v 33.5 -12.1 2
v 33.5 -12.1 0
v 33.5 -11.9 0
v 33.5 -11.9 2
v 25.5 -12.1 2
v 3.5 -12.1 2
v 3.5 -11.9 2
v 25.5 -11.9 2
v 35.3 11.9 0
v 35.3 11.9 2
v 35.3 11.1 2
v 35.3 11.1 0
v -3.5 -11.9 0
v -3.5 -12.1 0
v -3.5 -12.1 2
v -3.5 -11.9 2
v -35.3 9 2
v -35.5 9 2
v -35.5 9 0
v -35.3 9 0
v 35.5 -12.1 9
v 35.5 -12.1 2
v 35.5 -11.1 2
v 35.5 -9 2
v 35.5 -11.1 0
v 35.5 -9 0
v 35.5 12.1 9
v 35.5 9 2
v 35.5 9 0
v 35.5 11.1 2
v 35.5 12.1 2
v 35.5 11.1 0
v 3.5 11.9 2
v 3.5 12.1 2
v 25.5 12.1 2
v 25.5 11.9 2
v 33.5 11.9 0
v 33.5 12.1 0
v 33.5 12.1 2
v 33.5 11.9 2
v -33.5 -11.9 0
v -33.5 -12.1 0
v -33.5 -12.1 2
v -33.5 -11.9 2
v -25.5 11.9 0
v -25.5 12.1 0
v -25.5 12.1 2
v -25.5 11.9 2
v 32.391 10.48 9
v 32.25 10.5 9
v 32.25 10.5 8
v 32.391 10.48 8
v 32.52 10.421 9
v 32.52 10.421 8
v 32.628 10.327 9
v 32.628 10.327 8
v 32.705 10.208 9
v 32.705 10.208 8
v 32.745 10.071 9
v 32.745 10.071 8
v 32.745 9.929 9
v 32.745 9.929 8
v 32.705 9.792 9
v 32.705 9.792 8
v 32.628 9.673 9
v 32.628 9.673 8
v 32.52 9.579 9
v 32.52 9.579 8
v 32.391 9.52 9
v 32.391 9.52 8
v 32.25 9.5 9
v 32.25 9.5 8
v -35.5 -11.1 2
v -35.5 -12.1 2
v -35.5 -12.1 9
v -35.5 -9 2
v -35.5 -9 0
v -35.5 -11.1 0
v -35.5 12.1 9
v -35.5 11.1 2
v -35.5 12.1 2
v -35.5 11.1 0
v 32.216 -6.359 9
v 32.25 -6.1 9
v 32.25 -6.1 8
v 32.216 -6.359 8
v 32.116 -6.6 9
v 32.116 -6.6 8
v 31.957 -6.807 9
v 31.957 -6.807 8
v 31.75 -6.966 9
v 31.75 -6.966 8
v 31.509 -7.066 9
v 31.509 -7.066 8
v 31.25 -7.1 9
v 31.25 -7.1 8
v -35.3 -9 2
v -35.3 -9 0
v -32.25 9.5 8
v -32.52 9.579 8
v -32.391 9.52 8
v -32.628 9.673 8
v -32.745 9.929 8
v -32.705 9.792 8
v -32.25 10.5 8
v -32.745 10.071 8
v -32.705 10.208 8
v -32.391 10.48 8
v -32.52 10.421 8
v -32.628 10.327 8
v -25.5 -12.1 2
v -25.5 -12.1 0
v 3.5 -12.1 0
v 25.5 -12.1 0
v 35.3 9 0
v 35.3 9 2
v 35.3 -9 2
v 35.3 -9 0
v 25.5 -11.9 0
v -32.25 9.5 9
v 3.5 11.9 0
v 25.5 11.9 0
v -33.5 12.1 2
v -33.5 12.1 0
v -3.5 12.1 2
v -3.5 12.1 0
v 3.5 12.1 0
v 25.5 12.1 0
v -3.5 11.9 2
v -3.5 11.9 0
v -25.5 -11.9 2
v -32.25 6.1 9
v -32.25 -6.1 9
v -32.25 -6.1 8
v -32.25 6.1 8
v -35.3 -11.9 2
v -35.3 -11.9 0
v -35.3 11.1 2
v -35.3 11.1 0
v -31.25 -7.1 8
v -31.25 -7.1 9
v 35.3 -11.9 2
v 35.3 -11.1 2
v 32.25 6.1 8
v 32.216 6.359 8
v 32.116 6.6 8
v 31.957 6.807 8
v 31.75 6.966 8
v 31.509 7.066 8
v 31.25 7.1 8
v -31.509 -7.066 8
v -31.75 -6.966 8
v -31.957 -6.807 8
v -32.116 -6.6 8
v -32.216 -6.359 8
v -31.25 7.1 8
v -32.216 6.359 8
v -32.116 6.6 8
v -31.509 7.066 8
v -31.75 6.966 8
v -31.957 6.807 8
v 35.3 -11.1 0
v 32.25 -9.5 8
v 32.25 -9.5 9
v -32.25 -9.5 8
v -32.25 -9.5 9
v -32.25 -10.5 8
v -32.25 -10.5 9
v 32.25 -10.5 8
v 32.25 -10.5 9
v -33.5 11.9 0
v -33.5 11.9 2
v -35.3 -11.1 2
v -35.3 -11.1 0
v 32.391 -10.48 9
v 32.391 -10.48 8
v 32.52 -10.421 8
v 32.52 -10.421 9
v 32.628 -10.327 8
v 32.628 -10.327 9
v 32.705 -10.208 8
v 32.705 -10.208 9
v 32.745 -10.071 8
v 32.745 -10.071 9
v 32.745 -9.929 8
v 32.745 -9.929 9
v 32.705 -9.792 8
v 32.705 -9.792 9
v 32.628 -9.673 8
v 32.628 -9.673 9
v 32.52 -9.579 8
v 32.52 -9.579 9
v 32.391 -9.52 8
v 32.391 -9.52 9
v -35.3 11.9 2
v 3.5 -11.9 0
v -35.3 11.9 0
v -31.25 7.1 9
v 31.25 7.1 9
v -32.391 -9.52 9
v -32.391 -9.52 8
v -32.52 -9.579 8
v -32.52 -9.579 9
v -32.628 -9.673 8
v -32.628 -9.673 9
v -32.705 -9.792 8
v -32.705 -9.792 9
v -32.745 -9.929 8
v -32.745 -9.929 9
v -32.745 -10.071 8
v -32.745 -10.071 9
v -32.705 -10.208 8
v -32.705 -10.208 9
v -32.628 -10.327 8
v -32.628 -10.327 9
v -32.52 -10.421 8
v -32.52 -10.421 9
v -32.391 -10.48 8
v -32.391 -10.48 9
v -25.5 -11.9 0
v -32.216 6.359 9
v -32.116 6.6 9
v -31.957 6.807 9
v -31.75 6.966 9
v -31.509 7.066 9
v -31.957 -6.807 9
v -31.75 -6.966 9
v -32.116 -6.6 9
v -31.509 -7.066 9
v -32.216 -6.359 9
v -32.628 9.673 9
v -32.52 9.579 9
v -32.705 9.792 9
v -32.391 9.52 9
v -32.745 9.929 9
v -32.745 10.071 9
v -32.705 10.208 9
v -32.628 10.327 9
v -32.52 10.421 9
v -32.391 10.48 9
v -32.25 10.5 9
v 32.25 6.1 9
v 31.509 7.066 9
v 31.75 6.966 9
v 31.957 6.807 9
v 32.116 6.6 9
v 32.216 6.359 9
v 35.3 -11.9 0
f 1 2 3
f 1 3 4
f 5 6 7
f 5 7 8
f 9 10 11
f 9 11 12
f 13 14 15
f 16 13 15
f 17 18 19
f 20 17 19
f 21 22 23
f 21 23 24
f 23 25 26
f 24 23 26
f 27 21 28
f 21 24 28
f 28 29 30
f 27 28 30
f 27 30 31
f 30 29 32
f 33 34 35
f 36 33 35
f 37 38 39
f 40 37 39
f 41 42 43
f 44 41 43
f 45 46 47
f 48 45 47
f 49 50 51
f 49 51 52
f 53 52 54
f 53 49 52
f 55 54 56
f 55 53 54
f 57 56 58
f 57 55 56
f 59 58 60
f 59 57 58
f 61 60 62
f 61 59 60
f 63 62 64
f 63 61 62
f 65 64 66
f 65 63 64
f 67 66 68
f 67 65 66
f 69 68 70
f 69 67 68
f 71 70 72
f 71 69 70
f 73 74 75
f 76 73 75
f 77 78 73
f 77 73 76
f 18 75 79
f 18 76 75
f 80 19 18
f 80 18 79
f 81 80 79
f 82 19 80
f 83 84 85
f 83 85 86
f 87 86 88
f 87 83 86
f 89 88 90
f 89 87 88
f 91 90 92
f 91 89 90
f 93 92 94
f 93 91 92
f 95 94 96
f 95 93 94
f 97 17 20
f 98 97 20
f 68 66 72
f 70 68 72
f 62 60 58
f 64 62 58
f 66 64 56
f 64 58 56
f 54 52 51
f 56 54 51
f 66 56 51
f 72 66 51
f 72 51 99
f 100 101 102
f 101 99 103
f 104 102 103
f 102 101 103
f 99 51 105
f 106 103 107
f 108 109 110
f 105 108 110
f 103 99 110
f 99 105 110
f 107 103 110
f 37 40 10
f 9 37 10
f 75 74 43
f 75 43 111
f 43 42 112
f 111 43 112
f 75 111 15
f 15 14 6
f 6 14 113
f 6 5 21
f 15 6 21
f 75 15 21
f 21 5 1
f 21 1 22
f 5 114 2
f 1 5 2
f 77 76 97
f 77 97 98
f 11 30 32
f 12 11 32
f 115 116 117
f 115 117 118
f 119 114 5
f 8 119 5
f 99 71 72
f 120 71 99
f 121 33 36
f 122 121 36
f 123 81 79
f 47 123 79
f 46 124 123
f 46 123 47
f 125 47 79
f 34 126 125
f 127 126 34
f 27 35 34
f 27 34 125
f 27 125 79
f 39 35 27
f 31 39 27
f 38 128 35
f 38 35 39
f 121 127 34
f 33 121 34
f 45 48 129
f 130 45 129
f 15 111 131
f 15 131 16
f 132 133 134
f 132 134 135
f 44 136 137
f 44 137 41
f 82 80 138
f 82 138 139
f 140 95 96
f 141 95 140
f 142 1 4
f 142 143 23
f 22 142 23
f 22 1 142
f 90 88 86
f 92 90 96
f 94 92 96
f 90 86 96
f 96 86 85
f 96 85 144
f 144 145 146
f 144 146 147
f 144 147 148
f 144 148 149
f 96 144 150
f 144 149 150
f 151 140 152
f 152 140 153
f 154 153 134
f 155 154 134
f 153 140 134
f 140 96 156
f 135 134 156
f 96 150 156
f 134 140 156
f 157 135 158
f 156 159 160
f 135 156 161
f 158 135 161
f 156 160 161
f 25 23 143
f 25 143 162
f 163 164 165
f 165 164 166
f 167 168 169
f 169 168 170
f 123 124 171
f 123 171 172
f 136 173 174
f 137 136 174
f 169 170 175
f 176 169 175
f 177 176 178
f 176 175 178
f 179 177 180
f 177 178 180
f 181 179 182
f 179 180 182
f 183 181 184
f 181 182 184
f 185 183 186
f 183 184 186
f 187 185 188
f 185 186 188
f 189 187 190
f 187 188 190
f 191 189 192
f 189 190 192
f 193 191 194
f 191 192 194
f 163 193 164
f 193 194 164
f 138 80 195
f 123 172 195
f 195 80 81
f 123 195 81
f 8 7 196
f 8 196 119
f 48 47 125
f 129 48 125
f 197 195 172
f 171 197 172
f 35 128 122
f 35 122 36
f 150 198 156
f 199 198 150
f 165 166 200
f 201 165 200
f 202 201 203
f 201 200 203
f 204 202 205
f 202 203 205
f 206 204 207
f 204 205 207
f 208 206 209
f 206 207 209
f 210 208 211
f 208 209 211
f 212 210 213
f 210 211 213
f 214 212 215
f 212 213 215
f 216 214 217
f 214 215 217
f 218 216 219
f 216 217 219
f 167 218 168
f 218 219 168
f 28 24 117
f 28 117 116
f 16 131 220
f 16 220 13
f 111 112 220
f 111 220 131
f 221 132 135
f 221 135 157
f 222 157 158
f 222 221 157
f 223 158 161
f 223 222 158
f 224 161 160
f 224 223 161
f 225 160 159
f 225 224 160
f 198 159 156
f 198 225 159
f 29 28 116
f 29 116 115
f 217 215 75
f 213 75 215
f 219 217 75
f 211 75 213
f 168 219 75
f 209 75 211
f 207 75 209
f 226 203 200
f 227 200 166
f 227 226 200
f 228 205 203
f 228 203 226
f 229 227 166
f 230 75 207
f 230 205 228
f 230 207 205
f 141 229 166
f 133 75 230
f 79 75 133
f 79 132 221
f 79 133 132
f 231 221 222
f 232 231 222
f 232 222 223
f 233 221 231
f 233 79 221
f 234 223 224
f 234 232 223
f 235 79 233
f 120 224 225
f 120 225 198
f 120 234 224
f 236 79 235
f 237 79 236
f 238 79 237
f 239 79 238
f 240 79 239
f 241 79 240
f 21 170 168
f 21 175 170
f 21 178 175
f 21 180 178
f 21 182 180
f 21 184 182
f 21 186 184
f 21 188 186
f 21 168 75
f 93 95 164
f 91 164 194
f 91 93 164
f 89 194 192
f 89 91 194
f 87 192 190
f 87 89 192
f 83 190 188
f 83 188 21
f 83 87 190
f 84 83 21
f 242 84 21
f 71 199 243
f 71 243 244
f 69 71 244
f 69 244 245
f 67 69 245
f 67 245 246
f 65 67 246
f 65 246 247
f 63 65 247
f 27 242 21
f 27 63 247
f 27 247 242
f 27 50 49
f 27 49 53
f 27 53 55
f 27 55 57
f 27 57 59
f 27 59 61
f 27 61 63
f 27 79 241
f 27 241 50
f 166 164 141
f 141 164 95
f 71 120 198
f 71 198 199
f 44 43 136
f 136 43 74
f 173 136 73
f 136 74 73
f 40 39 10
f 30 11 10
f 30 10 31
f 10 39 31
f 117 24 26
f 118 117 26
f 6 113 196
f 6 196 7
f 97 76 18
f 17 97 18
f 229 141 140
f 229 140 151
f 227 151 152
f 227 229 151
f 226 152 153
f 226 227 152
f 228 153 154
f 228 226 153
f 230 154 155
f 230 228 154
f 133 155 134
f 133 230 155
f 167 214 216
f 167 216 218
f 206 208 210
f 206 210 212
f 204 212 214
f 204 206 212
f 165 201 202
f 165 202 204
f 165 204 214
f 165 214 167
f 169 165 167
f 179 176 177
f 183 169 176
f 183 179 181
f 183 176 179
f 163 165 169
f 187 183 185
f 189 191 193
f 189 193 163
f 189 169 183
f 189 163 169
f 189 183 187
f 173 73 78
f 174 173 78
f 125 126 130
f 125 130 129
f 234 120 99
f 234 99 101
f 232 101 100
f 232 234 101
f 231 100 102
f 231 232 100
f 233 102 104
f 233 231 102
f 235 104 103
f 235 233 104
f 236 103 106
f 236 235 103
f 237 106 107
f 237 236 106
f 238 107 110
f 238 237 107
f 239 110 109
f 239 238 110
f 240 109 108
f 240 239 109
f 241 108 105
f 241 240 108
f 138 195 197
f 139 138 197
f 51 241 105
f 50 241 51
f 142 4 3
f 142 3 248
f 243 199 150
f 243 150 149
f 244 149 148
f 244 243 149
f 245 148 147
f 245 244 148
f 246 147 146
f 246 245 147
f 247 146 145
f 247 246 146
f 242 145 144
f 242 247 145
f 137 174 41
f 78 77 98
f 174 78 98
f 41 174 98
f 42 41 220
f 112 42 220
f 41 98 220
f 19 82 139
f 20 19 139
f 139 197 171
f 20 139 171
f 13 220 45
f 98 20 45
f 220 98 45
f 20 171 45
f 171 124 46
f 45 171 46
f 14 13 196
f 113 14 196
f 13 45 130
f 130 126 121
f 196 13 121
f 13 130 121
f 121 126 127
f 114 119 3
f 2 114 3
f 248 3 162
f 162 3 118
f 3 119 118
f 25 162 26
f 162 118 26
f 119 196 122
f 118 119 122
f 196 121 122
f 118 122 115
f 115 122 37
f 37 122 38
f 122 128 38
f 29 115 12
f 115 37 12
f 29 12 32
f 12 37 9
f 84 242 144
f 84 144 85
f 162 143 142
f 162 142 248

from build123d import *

# Parameters (mm, degrees)
ESQUISSE1_W             = 71
ESQUISSE1_H             = 24.2
BOSS_EXTRU_1_DEPTH      = 9
ENL_V_MAT_EXTRU_1_DEPTH = 1
ENL_V_MAT_EXTRU_2_DEPTH = 1
ESQUISSE4_W             = 22
ESQUISSE4_H             = 4
ESQUISSE4_W_2           = 4
ENL_V_MAT_EXTRU_3_DEPTH = 0.2
ESQUISSE5_W             = 4
ESQUISSE5_H             = 1
ESQUISSE5_H_2           = 18
ENL_V_MAT_EXTRU_4_DEPTH = 0.2


with BuildPart() as part:
    # Esquisse1 → Boss.-Extru.1 (new body)
    with BuildSketch(Plane.XY):
        Rectangle(ESQUISSE1_W, ESQUISSE1_H)
    extrude(amount=BOSS_EXTRU_1_DEPTH)

    # Esquisse2 → Enlèv. mat.-Extru.1 (cut)
    with BuildSketch(Plane.XY.offset(9)):
        with BuildLine():
            Line((-31.25, 7.1), (31.25, 7.1))
            ThreePointArc((31.25, 7.1), (31.957106781, 6.807106781), (32.25, 6.1))
            Line((32.25, 6.1), (32.25, -6.1))
            ThreePointArc((32.25, -6.1), (31.957106781, -6.807106781), (31.25, -7.1))
            Line((31.25, -7.1), (-31.25, -7.1))
            ThreePointArc((-31.25, -7.1), (-31.957106781, -6.807106781), (-32.25, -6.1))
            Line((-32.25, -6.1), (-32.25, 6.1))
            ThreePointArc((-32.25, 6.1), (-31.957106781, 6.807106781), (-31.25, 7.1))
        make_face()
    extrude(amount=-ENL_V_MAT_EXTRU_1_DEPTH, mode=Mode.SUBTRACT)

    # Esquisse3 → Enlèv. mat.-Extru.2 (cut)
    with BuildSketch(Plane.XY.offset(9)):
        with BuildLine():
            Line((-32.25, 10.5), (32.25, 10.5))
            ThreePointArc((32.25, 10.5), (32.75, 10), (32.25, 9.5))
            Line((32.25, 9.5), (-32.25, 9.5))
            ThreePointArc((-32.25, 9.5), (-32.75, 10), (-32.25, 10.5))
        make_face()
        with BuildLine():
            Line((-32.25, -10.5), (32.25, -10.5))
            ThreePointArc((32.25, -10.5), (32.75, -10), (32.25, -9.5))
            Line((32.25, -9.5), (-32.25, -9.5))
            ThreePointArc((-32.25, -9.5), (-32.75, -10), (-32.25, -10.5))
        make_face()
    extrude(amount=-ENL_V_MAT_EXTRU_2_DEPTH, mode=Mode.SUBTRACT)

    # Esquisse4 → Enlèv. mat.-Extru.3 (cut)
    with BuildSketch(Plane.XZ.offset(12.1)):
        with Locations((14.5, 0)):
            Rectangle(ESQUISSE4_W, ESQUISSE4_H)
        with Locations((-14.5, 0)):
            Rectangle(ESQUISSE4_W, ESQUISSE4_H)
        with Locations((35.5, 0)):
            Rectangle(ESQUISSE4_W_2, ESQUISSE4_H)
        with Locations((-35.5, 0)):
            Rectangle(ESQUISSE4_W_2, ESQUISSE4_H)
    enl_v_mat_extru_3 = extrude(amount=-ENL_V_MAT_EXTRU_3_DEPTH, mode=Mode.SUBTRACT)

    # Symétrie1: Enlèv. mat.-Extru.3 across plane
    add(enl_v_mat_extru_3.mirror(Plane.ZX), mode=Mode.SUBTRACT)

    # Esquisse5 → Enlèv. mat.-Extru.4 (cut)
    with BuildSketch(Plane(origin=(35.5, 0, 0), x_dir=(0, 0, -1), z_dir=(1, 0, 0))):
        with Locations((0, 11.6)):
            Rectangle(ESQUISSE5_W, ESQUISSE5_H)
        Rectangle(ESQUISSE5_W, ESQUISSE5_H_2)
        with Locations((0, -11.6)):
            Rectangle(ESQUISSE5_W, ESQUISSE5_H)
    enl_v_mat_extru_4 = extrude(amount=-ENL_V_MAT_EXTRU_4_DEPTH, mode=Mode.SUBTRACT)

    # Symétrie2: Enlèv. mat.-Extru.4 across plane
    add(enl_v_mat_extru_4.mirror(Plane(origin=(0, 0, 0), x_dir=(0, 0, 1), z_dir=(1, 0, 0))), mode=Mode.SUBTRACT)


solid = part.part
